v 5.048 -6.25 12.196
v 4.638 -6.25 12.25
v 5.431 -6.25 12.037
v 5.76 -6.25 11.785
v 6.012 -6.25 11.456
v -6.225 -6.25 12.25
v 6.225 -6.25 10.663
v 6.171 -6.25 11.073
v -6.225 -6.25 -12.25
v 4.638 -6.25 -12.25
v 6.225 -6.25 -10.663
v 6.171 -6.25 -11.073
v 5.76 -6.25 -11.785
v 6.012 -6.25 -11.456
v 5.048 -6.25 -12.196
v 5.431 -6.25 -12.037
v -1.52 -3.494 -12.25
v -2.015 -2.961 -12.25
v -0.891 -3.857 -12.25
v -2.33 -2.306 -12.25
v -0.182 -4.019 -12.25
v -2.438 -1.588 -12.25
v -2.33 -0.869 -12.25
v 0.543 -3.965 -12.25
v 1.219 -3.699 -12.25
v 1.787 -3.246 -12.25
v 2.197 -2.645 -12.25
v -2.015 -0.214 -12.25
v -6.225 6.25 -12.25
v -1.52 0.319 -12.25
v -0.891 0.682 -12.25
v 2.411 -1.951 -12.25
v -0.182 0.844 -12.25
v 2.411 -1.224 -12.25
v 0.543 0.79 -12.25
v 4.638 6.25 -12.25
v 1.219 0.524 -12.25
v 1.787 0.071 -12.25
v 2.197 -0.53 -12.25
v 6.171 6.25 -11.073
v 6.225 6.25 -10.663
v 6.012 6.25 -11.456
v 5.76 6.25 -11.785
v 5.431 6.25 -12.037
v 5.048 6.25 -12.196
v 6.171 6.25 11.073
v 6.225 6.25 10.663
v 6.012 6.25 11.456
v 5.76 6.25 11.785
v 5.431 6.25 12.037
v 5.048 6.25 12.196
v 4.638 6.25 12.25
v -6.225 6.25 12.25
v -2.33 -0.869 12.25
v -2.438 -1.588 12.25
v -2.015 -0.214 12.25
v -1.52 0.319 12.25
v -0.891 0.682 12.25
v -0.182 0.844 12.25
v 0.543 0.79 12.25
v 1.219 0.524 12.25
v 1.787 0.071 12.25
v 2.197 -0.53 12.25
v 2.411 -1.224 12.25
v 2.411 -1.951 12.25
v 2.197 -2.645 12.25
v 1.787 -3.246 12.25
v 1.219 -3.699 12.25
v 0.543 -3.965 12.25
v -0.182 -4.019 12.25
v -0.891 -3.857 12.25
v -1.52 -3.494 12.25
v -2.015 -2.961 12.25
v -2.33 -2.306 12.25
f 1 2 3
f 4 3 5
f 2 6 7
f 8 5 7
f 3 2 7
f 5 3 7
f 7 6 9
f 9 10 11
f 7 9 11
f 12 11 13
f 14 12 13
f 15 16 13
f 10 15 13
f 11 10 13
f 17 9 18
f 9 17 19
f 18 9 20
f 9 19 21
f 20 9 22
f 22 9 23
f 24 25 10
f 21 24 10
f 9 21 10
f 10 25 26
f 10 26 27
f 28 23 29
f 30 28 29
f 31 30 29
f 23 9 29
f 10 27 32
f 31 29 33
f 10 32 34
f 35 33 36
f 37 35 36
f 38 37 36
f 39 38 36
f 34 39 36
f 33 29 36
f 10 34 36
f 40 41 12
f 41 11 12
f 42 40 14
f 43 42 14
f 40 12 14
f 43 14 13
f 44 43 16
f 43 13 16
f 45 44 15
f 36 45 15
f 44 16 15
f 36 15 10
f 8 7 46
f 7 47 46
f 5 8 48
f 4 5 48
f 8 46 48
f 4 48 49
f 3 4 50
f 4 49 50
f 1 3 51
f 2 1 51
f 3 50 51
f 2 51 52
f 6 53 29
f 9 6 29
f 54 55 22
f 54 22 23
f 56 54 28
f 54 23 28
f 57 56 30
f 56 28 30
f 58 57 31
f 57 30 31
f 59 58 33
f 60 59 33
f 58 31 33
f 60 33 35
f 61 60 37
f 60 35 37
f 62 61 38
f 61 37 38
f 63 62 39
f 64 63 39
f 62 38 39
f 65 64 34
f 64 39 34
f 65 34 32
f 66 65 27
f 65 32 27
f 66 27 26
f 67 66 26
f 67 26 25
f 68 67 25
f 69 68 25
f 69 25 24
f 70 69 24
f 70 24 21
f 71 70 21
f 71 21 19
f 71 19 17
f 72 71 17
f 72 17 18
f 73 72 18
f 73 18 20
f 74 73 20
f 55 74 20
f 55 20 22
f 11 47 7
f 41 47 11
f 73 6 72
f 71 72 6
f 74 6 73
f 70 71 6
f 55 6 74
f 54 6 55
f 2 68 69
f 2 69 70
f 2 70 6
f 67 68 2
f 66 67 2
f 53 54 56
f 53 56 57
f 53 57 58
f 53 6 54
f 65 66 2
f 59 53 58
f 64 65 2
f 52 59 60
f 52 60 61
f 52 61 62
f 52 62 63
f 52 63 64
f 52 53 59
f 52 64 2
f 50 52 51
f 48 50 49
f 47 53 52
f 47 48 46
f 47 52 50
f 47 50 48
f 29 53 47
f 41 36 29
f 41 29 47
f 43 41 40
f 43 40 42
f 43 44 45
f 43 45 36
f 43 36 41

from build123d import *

# Parameters (mm, degrees)
SKETCH1_W           = 12.45
SKETCH1_H           = 24.5
BOSS_EXTRUDE1_DEPTH = 6.25
FILLET1_R           = 1.5875
SKETCH2_R           = 2.4384
CUT_EXTRUDE2_DEPTH  = 27.039645255


with BuildPart() as part:
    # Sketch1 → Boss-Extrude1 (new, symmetric)
    with BuildSketch(Plane(origin=(0, 0, 0), x_dir=(1, 0, 0), z_dir=(0, 1, 0))):
        Rectangle(SKETCH1_W, SKETCH1_H)
    extrude(amount=BOSS_EXTRUDE1_DEPTH, both=True)

    # Fillet1
    fillet1_edges = [part.edges().sort_by_distance(p)[0] for p in [
        (6.225, 0, 12.25),
        (6.225, 0, -12.25),
    ]]
    fillet(fillet1_edges, radius=FILLET1_R)

    # Sketch2 → Cut-Extrude2 (cut, through all)
    with BuildSketch(Plane(origin=(0, 0, -12.25), x_dir=(-1, 0, 0), z_dir=(0, 0, -1))):
        with Locations((0, -1.5875)):
            Circle(SKETCH2_R)
    extrude(amount=-CUT_EXTRUDE2_DEPTH, mode=Mode.SUBTRACT)


solid = part.part
